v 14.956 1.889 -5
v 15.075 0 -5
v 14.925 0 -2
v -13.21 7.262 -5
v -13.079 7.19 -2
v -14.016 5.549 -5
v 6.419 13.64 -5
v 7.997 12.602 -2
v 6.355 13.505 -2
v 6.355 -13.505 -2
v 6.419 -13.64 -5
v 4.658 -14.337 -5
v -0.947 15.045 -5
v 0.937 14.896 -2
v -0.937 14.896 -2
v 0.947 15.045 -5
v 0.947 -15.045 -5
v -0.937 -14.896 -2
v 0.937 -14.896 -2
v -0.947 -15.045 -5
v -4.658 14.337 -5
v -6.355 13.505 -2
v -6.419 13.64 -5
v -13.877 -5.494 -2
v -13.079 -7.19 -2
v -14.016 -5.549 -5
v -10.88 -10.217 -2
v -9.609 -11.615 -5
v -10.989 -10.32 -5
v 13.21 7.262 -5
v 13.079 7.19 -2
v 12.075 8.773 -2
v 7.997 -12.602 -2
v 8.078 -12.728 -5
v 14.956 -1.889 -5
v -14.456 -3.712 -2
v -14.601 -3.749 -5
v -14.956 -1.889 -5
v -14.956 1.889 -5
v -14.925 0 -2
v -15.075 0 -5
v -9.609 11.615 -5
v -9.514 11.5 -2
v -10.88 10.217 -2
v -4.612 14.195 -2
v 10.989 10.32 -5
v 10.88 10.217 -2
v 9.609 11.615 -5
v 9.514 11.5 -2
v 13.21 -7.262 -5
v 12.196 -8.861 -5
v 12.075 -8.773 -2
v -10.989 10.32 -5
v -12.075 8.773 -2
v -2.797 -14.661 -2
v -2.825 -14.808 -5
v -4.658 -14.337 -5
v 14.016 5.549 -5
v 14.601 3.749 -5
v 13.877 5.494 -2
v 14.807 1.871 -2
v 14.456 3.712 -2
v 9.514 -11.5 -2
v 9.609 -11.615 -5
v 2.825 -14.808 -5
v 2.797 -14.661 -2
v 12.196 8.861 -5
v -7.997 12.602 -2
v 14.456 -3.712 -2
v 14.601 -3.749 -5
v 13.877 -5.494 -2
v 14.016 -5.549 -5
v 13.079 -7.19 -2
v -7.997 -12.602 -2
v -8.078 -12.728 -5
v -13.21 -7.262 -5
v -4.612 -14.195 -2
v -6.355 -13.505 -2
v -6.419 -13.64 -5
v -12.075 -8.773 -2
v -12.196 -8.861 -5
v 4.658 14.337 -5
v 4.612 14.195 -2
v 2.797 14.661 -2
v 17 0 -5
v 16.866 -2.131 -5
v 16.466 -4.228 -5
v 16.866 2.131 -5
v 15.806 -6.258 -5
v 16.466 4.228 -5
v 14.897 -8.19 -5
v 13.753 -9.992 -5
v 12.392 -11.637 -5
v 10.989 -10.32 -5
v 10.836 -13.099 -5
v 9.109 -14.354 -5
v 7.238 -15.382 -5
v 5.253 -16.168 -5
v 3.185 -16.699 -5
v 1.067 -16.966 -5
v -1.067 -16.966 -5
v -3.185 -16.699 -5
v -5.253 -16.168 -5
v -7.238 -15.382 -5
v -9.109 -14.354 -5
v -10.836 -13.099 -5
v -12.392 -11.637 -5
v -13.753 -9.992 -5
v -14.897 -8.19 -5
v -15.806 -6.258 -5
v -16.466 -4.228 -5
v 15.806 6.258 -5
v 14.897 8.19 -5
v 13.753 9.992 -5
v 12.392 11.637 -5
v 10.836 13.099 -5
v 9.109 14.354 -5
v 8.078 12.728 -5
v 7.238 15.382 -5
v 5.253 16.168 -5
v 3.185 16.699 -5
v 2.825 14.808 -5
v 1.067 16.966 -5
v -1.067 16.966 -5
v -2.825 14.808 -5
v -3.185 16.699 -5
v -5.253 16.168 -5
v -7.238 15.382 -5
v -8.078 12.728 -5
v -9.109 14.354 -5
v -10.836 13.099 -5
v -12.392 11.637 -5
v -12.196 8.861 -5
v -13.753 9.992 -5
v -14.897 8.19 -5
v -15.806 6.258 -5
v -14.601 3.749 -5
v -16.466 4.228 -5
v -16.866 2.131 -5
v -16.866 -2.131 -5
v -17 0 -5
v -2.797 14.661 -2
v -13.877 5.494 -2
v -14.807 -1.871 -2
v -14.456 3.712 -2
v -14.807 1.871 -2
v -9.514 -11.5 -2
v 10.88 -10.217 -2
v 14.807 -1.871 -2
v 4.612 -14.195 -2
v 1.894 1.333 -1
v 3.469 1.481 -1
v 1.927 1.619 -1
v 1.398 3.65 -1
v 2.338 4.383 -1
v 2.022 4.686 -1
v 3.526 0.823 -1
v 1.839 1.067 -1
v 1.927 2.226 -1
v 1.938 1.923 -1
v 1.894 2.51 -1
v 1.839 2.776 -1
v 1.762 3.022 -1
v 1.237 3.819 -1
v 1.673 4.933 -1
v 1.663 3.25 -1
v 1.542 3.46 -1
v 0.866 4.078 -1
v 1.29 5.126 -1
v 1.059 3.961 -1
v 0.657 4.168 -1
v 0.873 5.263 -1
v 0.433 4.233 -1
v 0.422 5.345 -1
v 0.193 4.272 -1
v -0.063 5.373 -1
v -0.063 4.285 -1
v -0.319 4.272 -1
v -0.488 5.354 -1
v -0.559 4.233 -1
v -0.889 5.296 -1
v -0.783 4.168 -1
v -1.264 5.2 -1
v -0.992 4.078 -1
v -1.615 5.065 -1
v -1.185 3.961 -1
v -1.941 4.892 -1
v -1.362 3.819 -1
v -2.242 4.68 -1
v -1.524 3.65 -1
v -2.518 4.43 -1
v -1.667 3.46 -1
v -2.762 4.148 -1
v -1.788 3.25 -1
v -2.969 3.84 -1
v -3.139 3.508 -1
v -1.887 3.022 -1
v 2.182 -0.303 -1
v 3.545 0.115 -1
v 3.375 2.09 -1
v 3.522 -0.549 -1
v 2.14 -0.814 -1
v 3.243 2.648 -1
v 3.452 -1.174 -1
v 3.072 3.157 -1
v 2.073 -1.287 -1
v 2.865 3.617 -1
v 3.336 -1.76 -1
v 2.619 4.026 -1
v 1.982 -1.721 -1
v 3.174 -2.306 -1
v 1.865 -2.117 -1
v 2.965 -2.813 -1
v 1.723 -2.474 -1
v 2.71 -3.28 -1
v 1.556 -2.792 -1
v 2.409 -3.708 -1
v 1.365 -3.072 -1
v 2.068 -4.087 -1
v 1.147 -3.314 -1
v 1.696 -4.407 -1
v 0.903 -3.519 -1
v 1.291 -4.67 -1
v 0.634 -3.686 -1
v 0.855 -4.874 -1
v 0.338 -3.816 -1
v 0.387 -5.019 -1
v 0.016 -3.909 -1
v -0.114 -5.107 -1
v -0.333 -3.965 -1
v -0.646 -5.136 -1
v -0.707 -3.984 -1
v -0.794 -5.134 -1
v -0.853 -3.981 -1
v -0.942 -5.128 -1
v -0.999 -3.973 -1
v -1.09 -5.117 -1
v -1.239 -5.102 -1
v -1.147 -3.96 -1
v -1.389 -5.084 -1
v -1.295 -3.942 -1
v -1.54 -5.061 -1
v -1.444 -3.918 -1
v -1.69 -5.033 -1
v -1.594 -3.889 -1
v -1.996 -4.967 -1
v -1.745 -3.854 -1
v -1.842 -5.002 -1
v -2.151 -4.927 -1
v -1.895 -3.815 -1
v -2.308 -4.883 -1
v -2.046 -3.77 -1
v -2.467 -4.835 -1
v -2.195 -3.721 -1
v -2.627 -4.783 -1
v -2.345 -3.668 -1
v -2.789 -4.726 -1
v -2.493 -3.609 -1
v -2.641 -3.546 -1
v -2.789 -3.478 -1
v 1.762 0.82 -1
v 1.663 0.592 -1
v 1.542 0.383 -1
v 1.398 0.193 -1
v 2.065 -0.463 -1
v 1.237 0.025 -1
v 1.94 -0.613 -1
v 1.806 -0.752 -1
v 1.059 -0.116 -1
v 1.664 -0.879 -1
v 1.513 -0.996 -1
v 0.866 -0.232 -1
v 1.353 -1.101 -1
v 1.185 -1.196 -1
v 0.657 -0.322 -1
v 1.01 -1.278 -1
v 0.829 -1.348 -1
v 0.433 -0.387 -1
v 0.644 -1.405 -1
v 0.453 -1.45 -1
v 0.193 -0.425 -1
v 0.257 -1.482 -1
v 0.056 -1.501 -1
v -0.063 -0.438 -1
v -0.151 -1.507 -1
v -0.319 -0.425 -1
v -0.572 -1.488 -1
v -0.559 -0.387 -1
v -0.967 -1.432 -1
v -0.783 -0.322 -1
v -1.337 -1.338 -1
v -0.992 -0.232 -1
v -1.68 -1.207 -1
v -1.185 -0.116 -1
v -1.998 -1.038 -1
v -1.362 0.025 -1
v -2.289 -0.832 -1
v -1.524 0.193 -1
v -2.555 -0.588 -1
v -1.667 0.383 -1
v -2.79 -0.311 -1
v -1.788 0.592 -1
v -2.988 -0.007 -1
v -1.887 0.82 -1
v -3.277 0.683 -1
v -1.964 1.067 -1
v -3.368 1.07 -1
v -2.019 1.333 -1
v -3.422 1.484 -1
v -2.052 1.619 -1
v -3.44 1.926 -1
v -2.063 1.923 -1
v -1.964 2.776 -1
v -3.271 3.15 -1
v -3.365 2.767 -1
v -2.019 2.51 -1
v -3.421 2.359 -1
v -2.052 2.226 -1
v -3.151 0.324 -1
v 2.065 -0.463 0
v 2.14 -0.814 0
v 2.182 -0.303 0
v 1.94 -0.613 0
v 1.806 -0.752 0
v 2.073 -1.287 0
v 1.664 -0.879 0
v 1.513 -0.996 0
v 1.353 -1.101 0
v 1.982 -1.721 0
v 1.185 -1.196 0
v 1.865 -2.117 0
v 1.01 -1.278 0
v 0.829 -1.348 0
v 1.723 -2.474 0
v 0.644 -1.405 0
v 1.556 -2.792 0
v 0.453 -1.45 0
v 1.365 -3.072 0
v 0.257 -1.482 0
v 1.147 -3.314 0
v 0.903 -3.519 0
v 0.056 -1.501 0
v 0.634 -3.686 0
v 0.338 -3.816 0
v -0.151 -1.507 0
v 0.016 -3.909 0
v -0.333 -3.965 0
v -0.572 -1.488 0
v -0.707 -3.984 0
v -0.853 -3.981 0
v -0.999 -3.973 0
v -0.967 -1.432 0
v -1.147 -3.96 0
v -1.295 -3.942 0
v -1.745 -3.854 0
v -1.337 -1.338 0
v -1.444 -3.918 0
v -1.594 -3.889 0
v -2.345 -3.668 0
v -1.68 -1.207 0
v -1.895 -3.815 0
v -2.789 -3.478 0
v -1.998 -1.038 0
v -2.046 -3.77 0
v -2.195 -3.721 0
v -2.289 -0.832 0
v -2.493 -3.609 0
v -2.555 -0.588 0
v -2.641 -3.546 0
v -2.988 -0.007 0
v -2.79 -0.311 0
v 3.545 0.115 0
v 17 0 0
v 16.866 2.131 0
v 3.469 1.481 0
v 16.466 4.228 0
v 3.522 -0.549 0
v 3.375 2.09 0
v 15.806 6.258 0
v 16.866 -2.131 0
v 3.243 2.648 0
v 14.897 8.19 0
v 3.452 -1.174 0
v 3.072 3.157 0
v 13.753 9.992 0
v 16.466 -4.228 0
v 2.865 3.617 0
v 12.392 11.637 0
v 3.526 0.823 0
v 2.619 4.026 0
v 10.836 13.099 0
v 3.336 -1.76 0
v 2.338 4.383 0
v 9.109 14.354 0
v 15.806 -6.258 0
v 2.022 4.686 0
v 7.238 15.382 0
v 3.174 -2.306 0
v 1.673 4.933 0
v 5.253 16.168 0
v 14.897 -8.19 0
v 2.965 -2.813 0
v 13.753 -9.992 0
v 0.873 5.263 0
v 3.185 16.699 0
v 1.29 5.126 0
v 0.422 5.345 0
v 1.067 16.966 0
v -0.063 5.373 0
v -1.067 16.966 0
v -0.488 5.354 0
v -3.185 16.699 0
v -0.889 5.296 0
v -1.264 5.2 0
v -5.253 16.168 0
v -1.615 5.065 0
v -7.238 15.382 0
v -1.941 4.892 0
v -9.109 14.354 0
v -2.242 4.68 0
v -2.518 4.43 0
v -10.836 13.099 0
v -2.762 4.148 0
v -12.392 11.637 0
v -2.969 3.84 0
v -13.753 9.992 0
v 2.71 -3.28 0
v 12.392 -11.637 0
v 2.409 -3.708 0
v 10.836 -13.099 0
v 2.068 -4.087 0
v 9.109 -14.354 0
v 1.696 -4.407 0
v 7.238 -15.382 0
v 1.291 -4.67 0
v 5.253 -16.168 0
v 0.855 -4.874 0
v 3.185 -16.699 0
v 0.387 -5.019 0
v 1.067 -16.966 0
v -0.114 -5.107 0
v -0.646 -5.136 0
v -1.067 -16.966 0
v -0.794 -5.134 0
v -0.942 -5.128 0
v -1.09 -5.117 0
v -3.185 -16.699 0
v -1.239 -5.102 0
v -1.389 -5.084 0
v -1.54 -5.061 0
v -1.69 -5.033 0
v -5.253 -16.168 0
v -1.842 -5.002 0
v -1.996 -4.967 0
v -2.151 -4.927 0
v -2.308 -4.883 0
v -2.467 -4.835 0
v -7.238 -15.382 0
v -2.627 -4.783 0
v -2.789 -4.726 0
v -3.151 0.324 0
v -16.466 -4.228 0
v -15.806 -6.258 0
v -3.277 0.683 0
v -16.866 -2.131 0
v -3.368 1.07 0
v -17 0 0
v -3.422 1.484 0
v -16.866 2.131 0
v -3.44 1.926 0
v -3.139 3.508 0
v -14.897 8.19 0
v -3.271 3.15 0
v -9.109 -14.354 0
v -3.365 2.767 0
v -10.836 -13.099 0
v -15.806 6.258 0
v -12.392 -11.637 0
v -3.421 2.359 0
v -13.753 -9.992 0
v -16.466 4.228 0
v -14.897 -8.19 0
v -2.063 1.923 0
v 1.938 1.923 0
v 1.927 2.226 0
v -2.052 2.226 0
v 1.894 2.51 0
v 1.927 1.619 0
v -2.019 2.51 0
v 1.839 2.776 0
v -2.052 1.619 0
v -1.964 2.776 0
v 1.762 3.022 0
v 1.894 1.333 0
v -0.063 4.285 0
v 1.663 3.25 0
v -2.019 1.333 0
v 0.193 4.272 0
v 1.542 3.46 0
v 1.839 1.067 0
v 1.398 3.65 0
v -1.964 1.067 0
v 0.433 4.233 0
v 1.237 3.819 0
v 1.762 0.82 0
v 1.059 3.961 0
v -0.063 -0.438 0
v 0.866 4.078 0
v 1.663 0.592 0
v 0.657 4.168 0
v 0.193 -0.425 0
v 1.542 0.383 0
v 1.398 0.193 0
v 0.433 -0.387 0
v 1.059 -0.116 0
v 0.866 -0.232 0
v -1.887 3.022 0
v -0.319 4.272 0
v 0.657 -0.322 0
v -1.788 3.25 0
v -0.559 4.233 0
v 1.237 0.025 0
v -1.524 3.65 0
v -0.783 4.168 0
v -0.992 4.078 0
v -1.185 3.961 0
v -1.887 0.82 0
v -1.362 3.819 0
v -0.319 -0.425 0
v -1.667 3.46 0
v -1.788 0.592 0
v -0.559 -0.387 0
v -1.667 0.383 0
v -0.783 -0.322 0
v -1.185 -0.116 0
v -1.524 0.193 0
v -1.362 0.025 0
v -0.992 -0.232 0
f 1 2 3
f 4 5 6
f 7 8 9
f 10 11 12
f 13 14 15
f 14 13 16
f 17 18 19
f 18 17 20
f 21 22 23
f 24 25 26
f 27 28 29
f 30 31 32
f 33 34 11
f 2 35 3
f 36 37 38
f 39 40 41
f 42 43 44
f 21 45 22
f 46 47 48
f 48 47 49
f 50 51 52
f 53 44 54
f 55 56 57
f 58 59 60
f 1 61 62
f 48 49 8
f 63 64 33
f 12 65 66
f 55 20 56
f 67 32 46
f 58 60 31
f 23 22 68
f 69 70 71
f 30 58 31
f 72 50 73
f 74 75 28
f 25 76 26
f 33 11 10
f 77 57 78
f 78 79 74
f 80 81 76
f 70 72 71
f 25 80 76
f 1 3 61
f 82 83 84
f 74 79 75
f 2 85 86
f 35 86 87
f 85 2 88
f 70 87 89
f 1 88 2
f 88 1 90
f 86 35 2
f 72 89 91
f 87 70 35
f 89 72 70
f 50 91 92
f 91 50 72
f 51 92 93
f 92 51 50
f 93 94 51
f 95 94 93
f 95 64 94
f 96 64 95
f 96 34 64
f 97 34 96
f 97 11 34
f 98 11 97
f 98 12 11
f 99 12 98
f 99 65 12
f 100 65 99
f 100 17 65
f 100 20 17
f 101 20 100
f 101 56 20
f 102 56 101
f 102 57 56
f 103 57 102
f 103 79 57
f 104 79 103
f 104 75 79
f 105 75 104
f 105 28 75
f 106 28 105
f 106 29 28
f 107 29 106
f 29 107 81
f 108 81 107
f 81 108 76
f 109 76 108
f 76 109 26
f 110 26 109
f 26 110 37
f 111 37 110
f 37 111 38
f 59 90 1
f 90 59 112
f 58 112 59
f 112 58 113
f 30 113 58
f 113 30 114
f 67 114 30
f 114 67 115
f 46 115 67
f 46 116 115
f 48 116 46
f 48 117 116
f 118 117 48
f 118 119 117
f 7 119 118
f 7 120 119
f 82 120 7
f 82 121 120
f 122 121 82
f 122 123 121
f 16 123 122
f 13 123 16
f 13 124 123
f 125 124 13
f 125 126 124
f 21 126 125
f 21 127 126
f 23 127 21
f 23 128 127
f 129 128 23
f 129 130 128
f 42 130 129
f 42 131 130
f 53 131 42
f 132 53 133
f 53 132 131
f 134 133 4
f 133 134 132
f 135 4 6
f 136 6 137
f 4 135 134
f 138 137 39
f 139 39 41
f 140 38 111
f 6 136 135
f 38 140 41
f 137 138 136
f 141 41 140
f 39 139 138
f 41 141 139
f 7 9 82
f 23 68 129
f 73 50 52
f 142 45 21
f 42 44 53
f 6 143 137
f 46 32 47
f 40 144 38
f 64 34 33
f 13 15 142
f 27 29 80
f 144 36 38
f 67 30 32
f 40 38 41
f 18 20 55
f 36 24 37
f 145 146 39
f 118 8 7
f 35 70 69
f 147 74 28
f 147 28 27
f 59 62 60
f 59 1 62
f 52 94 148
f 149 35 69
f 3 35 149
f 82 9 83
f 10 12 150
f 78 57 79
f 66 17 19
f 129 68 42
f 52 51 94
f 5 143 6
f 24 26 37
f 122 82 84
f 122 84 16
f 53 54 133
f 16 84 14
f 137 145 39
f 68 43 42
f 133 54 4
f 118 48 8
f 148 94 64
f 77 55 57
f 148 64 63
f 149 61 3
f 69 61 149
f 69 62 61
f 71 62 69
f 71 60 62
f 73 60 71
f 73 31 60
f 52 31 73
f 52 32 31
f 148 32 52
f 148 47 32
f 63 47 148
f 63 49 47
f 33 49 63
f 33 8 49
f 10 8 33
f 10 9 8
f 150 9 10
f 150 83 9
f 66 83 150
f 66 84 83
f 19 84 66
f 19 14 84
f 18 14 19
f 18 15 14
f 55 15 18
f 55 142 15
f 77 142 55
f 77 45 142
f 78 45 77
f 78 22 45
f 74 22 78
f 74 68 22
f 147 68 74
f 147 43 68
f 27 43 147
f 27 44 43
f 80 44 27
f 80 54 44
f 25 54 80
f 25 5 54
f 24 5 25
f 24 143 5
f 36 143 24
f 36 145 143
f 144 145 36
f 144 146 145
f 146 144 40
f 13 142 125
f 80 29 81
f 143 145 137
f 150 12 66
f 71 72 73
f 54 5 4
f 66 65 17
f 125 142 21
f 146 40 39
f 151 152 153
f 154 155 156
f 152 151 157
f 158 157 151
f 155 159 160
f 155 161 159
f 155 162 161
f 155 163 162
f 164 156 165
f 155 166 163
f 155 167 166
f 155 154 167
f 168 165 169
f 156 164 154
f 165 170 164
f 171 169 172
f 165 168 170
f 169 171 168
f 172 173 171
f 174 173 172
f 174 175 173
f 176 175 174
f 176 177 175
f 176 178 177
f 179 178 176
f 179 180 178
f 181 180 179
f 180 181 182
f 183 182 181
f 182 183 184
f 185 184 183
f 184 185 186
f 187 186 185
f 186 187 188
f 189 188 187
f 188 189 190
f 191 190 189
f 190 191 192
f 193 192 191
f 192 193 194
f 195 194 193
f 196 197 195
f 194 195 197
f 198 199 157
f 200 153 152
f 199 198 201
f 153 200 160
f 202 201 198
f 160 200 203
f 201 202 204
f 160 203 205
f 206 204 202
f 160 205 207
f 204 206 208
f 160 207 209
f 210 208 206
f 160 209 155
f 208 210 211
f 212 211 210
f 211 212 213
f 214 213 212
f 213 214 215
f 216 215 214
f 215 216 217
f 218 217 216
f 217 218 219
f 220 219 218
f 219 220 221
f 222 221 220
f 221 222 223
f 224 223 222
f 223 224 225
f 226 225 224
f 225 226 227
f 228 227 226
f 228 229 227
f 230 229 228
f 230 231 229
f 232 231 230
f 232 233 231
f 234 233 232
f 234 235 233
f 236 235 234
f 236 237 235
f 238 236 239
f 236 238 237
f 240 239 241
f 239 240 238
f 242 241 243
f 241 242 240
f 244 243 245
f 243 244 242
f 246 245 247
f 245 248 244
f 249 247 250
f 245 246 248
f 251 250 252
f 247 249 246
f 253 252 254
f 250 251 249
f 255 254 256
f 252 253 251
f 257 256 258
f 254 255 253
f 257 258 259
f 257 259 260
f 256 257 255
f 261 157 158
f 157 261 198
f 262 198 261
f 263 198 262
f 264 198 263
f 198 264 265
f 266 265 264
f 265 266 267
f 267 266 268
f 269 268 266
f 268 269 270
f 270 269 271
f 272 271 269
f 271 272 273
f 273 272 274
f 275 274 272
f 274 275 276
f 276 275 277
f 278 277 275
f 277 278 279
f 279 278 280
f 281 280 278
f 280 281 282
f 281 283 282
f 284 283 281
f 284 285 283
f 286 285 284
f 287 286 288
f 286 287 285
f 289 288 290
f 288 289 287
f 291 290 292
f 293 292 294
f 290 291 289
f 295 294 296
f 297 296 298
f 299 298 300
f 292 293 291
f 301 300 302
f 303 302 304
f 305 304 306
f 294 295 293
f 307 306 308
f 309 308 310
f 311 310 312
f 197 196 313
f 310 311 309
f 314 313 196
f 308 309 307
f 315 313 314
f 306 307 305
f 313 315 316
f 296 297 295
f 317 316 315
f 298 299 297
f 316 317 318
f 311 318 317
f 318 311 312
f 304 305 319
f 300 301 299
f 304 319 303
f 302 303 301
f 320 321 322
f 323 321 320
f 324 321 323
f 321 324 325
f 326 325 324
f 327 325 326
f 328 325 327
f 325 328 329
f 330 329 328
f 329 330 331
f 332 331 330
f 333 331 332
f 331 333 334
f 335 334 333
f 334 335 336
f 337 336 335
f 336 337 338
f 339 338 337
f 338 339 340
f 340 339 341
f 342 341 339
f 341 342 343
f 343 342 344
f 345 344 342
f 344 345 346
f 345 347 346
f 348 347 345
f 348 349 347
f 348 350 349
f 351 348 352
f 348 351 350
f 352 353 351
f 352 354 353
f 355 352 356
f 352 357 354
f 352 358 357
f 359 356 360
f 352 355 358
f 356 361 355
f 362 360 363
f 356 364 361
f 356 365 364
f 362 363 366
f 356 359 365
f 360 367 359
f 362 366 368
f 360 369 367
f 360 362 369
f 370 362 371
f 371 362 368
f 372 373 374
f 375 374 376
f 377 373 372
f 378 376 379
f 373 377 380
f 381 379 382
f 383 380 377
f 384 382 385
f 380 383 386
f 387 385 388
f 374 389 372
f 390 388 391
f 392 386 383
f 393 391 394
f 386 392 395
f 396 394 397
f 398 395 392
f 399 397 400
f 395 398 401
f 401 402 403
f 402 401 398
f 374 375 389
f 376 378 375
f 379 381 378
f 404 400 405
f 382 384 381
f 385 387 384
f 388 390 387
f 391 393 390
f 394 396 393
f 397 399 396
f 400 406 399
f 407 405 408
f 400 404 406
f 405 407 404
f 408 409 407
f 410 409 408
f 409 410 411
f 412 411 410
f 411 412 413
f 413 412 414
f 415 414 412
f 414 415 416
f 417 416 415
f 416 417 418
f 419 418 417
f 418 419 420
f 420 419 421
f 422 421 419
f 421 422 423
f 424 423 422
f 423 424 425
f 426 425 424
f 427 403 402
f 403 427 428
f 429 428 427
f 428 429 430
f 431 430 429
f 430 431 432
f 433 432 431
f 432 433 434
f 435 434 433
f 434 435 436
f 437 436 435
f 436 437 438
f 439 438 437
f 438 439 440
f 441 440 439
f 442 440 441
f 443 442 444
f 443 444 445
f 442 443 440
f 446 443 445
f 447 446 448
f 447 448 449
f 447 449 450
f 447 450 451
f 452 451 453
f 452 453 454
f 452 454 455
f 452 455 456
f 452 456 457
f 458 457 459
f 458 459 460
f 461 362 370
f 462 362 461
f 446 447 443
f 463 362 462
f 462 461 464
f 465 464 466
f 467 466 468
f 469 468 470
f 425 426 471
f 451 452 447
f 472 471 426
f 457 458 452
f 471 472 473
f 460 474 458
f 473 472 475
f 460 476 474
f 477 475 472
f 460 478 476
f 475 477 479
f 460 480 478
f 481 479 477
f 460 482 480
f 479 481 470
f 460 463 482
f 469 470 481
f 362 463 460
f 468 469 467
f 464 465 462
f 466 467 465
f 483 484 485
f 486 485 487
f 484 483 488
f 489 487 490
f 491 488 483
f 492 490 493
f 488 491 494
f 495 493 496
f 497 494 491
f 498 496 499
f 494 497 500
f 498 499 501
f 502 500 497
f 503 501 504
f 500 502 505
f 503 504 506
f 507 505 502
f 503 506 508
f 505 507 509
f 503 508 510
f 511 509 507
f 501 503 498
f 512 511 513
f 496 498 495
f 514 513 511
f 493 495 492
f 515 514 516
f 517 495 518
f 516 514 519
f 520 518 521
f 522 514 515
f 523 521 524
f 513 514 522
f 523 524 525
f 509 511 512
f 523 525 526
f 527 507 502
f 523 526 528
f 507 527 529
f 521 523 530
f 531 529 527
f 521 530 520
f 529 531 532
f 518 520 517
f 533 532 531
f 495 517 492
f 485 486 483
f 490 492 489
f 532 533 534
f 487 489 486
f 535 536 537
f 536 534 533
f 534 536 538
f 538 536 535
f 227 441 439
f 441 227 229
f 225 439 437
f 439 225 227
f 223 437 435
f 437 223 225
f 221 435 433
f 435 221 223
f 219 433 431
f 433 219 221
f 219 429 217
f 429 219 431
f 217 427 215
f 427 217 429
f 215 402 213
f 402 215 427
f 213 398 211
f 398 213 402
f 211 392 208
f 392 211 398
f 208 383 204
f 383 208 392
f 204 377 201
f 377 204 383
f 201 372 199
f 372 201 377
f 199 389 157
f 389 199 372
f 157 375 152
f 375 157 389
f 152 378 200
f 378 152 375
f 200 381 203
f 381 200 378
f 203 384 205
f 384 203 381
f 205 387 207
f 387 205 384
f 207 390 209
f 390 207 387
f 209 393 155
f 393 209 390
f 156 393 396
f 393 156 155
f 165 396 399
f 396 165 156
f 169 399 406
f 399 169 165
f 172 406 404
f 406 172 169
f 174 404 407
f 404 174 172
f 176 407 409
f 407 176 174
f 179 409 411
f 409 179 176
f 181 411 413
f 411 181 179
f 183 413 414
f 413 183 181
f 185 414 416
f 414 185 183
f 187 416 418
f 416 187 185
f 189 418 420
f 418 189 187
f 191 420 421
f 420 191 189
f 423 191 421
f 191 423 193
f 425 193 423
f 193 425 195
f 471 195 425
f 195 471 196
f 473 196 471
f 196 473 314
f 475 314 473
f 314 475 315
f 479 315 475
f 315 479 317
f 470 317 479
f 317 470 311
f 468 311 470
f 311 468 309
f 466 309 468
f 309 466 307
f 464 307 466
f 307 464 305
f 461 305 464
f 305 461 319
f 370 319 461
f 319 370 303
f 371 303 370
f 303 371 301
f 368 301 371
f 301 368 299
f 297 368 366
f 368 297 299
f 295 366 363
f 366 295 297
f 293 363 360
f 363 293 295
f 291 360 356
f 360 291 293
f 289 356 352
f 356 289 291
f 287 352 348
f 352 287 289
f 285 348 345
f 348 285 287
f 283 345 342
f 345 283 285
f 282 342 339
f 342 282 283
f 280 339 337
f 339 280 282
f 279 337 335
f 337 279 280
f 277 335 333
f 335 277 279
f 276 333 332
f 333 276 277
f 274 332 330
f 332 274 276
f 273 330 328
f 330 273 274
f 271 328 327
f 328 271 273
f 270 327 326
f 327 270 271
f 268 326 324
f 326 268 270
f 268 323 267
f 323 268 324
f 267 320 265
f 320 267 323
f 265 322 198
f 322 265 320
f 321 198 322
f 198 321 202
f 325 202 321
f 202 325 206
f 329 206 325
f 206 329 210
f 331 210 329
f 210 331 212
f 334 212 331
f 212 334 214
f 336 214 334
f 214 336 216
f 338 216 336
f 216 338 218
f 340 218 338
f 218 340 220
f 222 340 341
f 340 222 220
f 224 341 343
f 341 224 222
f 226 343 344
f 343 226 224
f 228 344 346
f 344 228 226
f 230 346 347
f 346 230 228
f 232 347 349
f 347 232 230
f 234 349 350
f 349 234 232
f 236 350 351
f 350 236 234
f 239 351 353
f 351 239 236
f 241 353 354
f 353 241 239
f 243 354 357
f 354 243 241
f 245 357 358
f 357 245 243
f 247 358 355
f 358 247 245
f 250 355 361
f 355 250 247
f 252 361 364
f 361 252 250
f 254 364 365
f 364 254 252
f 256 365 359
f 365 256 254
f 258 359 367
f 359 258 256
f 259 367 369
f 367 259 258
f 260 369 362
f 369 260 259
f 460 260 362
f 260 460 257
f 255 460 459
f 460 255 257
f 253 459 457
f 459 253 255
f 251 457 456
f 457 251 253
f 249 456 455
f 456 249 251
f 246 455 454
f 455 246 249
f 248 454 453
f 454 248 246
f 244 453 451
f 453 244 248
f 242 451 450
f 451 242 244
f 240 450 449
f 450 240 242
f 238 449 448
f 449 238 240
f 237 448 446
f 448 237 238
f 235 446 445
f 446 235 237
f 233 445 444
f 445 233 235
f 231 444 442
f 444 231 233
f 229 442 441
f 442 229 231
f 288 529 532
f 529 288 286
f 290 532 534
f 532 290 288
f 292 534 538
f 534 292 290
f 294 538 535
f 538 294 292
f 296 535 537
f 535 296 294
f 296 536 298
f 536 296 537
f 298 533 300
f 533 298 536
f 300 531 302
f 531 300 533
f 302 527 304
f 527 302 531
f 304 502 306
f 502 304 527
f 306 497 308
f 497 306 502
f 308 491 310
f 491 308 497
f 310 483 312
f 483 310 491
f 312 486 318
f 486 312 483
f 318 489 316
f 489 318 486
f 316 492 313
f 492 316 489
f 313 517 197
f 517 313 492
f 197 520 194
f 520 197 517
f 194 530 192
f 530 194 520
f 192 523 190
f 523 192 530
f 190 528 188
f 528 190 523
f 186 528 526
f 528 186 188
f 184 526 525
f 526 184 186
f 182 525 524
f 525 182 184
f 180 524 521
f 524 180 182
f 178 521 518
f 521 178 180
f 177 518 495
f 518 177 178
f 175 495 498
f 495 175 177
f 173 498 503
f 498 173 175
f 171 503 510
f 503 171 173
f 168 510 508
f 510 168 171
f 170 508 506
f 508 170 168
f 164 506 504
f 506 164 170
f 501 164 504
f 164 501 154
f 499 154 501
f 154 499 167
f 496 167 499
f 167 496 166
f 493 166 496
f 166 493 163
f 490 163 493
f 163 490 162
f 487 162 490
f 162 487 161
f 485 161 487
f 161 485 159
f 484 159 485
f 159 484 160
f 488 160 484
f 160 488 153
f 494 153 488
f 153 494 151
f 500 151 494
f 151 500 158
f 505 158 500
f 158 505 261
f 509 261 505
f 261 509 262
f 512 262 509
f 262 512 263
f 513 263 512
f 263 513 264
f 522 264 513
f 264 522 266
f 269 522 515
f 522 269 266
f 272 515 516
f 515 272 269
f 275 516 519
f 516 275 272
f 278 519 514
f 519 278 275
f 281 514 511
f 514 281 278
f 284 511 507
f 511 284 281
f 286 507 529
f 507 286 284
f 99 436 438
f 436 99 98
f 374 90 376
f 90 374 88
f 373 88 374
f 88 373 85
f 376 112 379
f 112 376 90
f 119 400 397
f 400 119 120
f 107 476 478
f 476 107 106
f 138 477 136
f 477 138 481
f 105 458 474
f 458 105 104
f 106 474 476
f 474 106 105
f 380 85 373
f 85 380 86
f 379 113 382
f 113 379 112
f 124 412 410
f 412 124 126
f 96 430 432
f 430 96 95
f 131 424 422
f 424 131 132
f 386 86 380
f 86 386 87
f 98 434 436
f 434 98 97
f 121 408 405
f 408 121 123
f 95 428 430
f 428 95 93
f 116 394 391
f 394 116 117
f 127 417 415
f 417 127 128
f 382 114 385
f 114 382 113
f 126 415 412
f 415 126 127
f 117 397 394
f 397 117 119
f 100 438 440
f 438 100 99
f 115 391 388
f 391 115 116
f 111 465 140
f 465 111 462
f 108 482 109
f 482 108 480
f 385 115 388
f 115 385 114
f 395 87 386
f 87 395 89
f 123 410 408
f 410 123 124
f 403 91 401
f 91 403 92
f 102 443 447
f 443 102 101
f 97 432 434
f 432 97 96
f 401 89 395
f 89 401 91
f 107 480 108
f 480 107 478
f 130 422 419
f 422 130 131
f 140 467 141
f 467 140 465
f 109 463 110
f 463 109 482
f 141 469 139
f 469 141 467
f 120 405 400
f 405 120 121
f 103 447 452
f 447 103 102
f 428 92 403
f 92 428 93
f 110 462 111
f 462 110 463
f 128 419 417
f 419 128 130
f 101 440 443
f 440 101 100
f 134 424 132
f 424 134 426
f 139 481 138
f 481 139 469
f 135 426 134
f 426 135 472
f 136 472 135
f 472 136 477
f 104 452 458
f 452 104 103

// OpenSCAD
$fn = 50;

difference() {
	union() {
		translate(v = [0, 0, -5.0]) {
			cylinder(h = 5, r = 17.0);
		}
	}
	union() {
		#translate(v = [0, 0, -5.0]) {
			cylinder(h = 3, r1 = 15.075, r2 = 14.925);
		}
		translate(v = [0, 0, -1]) {
			linear_extrude(height = 1) {
				text(font = "Impact", halign = "center", size = 10, text = "9", valign = "center");
			}
		}
	}
}
